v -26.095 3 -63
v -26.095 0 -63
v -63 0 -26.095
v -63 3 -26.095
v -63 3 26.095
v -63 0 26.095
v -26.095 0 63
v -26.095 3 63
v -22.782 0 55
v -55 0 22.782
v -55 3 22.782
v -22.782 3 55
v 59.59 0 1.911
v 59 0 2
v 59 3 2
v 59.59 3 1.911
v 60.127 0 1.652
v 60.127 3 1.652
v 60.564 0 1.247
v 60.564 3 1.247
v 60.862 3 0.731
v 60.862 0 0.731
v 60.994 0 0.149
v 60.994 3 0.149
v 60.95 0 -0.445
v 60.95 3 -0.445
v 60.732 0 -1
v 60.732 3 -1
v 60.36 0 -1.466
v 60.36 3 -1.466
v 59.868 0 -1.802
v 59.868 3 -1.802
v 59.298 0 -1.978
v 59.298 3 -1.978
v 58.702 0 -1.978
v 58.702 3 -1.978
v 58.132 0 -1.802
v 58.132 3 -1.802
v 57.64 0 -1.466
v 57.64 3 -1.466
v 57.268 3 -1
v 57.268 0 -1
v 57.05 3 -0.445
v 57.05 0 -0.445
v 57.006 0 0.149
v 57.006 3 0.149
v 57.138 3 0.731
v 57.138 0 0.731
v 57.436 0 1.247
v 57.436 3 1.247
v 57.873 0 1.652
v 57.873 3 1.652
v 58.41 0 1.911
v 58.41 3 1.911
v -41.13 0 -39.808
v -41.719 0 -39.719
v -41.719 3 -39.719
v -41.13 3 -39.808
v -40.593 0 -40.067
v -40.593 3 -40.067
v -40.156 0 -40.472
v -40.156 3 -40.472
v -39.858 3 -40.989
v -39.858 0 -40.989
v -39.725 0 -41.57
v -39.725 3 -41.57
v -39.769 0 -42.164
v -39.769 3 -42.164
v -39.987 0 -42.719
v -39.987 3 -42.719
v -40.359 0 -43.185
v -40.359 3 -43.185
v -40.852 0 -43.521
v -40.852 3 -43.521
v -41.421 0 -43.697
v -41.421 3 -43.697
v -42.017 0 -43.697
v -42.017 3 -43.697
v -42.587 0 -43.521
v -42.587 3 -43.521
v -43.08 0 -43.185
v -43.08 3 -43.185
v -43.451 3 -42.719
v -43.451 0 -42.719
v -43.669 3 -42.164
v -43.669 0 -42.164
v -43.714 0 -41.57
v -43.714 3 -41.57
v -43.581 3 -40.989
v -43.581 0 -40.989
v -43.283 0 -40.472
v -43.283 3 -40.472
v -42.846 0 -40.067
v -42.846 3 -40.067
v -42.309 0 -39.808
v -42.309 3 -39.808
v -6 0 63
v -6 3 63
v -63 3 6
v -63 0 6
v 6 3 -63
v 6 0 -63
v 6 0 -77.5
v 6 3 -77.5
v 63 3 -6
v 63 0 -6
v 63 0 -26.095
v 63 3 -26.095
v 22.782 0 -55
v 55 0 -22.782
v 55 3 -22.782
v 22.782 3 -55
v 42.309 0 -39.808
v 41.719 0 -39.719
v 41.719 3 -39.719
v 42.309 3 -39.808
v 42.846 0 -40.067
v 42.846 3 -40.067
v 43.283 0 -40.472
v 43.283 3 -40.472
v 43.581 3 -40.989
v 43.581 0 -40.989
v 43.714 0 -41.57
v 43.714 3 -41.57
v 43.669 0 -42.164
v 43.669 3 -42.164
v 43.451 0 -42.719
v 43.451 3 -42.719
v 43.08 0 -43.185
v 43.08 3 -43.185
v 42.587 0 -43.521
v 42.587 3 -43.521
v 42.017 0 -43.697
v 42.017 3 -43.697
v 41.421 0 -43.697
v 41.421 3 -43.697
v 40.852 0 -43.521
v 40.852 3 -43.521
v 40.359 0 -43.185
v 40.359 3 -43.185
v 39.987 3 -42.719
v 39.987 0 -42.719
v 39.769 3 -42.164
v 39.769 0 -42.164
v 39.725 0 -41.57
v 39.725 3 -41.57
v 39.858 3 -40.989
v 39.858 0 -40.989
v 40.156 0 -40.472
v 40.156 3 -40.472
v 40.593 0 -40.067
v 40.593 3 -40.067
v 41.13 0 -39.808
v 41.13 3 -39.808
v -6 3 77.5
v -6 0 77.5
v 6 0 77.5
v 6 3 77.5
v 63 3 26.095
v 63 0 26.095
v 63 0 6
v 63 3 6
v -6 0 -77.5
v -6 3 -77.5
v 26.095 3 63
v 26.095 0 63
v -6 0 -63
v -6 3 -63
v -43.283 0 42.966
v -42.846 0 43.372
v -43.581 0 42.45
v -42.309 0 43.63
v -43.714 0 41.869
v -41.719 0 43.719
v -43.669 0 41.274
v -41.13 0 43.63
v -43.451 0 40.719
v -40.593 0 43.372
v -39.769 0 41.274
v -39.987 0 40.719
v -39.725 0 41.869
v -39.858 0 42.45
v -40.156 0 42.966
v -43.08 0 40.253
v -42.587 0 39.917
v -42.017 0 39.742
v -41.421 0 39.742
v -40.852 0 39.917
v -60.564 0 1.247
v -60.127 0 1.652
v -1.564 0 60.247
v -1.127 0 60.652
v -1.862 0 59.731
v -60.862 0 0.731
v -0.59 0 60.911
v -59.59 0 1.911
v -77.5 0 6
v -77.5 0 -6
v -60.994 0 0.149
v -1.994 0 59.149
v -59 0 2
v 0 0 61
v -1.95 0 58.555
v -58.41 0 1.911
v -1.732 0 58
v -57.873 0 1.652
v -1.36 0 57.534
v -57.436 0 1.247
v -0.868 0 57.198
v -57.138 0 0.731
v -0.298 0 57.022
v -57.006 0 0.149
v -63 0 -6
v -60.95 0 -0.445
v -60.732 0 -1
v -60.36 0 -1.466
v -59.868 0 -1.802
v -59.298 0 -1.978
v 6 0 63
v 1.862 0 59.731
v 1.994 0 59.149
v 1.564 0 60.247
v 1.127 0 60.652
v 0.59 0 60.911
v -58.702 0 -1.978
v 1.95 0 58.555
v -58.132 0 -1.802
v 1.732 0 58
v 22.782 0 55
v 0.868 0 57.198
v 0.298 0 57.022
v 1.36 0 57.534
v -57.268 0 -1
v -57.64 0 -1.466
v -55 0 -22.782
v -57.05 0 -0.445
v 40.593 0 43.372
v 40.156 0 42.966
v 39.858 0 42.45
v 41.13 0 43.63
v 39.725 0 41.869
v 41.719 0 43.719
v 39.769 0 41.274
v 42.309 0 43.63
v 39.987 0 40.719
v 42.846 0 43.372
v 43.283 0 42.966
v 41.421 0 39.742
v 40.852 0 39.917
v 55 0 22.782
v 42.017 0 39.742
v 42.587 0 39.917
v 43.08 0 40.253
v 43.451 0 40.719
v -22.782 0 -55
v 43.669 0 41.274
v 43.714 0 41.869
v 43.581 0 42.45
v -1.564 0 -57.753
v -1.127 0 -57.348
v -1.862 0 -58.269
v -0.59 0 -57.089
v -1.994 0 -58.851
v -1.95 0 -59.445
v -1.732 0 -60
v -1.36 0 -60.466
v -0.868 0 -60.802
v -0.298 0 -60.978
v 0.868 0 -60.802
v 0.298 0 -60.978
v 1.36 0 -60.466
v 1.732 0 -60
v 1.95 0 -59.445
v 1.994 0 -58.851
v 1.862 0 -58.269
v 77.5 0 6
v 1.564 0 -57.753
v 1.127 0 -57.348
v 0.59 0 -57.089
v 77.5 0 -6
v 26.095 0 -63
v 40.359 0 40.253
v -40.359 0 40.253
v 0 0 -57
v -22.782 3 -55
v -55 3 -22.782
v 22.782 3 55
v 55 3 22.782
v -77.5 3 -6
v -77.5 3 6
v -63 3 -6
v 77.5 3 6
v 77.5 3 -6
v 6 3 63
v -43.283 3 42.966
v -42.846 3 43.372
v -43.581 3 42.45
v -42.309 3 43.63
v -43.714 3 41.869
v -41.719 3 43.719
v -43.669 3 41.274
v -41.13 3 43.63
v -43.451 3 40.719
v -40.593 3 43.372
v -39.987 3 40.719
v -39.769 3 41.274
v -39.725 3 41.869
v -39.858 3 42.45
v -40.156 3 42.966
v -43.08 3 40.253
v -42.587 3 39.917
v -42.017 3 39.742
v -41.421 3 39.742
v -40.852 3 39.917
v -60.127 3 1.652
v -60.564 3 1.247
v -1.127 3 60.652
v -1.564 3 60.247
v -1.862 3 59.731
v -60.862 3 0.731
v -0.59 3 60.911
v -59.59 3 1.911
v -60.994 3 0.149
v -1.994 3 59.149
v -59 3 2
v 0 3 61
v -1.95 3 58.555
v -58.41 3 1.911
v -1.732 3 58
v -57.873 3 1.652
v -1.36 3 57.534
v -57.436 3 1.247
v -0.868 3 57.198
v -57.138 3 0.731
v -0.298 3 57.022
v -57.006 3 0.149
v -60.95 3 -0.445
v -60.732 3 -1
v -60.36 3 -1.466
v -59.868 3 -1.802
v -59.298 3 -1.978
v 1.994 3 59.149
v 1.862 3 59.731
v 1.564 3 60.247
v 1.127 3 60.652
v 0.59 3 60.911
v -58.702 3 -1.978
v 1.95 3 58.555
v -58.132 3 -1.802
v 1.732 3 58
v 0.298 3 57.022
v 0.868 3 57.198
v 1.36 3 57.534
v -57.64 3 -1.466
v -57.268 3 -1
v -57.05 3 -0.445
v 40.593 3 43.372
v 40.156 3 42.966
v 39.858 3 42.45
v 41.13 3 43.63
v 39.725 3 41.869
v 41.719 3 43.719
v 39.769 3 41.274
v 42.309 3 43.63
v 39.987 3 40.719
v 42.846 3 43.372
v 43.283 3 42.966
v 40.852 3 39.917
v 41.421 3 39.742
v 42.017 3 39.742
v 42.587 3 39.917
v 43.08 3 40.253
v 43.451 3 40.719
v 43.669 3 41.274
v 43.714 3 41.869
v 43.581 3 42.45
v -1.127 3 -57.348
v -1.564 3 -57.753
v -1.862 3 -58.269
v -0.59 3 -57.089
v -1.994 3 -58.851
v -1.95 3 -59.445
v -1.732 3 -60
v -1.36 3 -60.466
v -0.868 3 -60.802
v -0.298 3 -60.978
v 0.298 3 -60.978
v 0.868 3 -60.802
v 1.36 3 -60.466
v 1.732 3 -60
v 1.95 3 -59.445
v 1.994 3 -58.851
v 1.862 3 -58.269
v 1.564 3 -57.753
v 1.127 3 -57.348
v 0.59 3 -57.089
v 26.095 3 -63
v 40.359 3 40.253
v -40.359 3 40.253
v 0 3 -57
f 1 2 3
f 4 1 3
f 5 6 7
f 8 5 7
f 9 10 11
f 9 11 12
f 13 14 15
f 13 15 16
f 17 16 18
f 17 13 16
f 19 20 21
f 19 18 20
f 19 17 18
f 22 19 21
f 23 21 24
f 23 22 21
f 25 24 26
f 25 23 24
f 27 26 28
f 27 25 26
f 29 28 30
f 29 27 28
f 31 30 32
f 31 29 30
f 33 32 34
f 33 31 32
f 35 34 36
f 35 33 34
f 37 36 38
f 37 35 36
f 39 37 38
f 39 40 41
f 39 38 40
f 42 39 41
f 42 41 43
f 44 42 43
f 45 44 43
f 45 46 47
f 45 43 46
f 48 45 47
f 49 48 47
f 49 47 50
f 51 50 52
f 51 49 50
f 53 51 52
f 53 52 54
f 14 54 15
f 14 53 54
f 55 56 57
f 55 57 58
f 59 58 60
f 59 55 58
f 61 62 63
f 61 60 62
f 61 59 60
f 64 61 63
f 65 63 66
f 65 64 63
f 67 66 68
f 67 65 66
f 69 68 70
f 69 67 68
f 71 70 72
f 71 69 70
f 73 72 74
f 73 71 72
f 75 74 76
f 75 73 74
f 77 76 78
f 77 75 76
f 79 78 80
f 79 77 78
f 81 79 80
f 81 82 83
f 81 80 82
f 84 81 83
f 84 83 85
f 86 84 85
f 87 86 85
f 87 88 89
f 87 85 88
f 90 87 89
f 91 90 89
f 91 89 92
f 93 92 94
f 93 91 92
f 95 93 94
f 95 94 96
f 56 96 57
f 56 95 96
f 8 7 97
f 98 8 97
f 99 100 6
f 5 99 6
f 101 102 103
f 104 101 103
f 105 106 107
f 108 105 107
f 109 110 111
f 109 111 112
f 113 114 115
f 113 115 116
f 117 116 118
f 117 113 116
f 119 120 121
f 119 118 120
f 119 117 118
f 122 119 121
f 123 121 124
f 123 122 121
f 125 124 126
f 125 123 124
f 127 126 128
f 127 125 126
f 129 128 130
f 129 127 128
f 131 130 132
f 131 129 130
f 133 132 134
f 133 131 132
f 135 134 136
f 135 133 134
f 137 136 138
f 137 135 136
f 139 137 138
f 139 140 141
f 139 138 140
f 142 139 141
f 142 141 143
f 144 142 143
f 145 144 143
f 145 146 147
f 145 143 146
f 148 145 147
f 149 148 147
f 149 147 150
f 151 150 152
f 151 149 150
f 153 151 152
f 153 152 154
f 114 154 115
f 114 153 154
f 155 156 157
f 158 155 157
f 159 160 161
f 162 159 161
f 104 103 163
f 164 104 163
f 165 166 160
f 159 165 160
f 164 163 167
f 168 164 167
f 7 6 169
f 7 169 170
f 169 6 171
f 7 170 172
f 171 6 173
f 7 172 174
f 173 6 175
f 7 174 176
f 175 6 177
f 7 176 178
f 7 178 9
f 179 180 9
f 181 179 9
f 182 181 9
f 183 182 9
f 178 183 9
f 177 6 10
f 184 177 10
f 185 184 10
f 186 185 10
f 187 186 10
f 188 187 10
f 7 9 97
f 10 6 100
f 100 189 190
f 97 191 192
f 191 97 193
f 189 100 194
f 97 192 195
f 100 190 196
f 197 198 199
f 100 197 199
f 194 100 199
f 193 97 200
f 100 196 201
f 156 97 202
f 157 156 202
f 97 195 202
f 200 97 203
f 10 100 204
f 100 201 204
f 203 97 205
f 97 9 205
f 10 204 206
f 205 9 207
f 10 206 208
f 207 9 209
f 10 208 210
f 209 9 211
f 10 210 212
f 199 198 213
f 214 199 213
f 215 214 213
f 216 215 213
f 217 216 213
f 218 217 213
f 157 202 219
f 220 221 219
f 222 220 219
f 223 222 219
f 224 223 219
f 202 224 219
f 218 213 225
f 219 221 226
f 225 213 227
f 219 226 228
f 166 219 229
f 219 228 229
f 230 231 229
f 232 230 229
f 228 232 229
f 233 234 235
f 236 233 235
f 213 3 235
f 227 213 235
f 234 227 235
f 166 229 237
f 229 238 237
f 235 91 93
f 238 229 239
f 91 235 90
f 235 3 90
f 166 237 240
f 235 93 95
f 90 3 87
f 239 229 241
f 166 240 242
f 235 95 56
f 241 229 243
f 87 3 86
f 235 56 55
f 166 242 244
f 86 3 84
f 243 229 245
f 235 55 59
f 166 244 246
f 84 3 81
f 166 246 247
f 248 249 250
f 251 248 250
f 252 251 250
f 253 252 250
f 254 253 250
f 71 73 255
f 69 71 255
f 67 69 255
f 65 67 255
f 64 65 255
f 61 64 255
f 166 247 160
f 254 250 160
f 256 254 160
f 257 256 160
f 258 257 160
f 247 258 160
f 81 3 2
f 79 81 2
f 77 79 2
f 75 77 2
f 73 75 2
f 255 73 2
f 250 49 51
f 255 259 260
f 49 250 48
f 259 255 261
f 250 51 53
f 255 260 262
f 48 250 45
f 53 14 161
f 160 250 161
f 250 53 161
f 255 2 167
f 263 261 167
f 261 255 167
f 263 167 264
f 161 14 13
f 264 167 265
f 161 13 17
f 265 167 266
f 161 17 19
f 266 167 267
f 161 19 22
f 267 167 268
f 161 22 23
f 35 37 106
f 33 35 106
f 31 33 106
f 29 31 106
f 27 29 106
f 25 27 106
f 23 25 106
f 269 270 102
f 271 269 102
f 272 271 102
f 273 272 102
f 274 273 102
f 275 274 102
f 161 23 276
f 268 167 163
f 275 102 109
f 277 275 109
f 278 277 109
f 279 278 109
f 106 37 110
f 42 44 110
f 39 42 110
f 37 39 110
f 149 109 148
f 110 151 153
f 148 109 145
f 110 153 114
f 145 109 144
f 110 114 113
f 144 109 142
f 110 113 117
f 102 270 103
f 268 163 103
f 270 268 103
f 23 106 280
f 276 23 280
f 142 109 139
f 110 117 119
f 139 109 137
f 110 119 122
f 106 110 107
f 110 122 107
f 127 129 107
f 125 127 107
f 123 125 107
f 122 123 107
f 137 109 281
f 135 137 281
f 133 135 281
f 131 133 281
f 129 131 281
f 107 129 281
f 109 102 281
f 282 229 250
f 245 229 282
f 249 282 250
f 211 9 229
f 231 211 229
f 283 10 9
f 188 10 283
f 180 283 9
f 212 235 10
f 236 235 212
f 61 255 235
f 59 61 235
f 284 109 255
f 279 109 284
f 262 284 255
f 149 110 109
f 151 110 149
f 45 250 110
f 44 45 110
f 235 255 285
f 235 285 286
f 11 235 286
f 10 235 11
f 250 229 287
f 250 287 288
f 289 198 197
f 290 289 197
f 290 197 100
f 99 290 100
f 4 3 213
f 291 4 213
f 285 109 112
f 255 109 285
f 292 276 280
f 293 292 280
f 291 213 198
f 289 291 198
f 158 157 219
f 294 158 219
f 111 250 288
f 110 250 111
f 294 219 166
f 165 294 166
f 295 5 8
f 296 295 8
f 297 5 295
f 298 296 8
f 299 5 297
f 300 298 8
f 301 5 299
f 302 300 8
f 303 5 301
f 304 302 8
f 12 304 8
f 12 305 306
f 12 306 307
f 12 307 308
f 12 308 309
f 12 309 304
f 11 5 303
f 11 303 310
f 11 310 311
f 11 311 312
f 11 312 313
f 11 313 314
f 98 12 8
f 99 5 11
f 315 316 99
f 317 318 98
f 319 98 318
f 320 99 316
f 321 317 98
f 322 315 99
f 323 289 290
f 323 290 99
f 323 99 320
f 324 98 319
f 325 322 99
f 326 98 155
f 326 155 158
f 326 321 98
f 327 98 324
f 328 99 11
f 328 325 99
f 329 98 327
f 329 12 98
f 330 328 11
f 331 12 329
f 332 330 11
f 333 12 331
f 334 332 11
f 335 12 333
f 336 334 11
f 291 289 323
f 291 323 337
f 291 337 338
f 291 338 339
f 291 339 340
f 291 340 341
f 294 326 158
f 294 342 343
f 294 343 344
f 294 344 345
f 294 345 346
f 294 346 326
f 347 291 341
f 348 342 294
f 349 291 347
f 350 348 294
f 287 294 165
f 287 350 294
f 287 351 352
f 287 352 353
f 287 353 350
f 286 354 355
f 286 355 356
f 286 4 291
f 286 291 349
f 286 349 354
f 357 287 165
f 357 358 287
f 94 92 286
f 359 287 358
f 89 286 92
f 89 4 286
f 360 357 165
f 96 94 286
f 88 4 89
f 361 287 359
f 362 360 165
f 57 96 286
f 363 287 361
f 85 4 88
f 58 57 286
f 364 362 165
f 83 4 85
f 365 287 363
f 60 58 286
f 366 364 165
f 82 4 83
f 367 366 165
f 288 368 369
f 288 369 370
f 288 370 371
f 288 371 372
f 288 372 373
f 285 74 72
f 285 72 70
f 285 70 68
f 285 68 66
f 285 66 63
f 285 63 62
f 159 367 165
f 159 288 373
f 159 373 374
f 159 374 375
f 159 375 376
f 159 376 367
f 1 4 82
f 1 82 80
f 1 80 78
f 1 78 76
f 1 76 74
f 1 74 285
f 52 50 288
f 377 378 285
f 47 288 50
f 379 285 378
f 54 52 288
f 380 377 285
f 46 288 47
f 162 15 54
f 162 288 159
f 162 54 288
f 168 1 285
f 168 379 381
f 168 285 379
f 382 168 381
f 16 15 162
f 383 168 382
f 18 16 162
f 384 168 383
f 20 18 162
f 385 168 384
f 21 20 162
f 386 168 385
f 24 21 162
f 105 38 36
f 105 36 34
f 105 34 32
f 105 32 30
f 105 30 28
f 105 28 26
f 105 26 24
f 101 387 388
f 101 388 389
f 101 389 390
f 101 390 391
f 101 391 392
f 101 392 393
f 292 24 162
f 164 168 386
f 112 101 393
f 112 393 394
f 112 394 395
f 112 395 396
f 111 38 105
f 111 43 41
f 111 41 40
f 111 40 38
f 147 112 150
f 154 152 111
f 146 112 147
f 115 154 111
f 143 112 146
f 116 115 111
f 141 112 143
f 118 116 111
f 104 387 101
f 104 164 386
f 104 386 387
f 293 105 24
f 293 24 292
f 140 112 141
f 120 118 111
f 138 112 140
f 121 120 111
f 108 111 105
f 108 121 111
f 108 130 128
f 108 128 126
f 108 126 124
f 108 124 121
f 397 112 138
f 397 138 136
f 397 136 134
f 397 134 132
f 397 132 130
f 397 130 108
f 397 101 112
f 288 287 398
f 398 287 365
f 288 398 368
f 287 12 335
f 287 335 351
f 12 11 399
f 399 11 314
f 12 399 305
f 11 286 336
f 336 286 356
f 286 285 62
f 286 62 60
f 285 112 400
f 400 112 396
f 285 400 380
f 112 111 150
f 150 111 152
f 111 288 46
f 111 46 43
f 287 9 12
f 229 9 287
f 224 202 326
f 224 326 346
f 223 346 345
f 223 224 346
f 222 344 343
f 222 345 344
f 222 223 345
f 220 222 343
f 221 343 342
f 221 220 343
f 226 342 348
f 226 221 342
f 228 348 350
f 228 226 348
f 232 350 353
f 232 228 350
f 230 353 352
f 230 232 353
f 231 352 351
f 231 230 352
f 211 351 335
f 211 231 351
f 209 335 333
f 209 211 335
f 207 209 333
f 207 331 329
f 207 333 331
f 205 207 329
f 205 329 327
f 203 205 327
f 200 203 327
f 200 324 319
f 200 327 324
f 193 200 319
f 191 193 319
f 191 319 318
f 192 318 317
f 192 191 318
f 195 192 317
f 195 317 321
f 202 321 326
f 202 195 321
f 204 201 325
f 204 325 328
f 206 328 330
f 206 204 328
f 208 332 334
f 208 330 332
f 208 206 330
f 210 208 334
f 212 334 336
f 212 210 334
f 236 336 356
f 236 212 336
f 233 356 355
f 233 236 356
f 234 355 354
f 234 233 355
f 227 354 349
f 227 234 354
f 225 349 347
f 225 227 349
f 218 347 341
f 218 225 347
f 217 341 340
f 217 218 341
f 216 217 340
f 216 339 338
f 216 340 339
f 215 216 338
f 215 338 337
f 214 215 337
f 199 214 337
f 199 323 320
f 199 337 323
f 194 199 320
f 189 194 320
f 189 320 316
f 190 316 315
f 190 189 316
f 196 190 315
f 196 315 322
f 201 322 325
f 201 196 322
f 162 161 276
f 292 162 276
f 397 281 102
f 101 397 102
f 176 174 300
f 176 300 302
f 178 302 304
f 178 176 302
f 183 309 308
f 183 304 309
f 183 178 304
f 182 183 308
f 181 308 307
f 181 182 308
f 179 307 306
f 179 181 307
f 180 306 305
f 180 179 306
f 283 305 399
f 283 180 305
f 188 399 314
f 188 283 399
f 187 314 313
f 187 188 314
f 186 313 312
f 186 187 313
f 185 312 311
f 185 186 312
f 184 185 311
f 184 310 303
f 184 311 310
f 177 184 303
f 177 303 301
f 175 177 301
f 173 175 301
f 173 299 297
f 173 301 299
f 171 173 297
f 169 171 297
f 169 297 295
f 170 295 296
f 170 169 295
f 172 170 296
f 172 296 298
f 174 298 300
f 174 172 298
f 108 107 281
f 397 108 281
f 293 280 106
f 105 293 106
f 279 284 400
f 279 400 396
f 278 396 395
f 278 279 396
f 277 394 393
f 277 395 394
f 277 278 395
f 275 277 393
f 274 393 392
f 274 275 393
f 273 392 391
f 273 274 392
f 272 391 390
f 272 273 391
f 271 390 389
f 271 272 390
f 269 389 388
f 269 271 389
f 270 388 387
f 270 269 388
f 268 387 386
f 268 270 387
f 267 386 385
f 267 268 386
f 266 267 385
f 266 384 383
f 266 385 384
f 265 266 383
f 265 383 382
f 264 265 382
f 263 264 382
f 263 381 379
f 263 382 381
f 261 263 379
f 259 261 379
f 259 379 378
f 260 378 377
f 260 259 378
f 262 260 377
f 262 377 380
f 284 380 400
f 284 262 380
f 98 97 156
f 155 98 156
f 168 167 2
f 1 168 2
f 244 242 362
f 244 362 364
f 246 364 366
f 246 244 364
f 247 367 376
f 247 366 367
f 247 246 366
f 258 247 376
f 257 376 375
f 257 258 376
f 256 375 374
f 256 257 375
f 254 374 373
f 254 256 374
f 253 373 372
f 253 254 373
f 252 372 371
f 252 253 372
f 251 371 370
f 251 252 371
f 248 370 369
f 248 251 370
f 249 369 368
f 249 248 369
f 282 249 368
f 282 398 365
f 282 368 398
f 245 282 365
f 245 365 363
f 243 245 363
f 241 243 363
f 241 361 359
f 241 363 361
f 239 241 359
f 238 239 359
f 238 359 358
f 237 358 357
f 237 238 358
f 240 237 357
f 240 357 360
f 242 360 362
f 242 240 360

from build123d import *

# Parameters (mm, degrees)
BOSS_EXTRUDE1_DEPTH     = 3
CUT_EXTRUDE1_DEPTH      = 84
CUT_EXTRUDE1_DEPTH_BACK = 76
SKETCH3_R               = 2


with BuildPart() as part:
    # Sketch2 → Boss-Extrude1 (new body)
    with BuildSketch(Plane(origin=(0, 0, 0), x_dir=(1, 0, 0), z_dir=(0, 1, 0))):
        Polygon((6, -77.5), (6, -63), (26.09545443, -63), (63, -26.09545443), (63, -6), (77.5, -6), (77.5, 6), (63, 6), (63, 26.09545443), (26.09545443, 63), (6, 63), (6, 77.5), (-6, 77.5), (-6, 63), (-26.09545443, 63), (-63, 26.09545443), (-63, 6), (-77.5, 6), (-77.5, -6), (-63, -6), (-63, -26.09545443), (-26.09545443, -63), (-6, -63), (-6, -77.5), align=None)
        Polygon((22.781745931, -55), (55, -22.781745931), (55, 22.781745931), (22.781745931, 55), (-22.781745931, 55), (-55, 22.781745931), (-55, -22.781745931), (-22.781745931, -55), align=None, mode=Mode.SUBTRACT)
    extrude(amount=BOSS_EXTRUDE1_DEPTH)

    # Sketch3 → Cut-Extrude1 (cut, two sides: drawn at the far end of the back side and taken through both)
    with BuildSketch(Plane(origin=(0, 3, 0), x_dir=(1, 0, 0), z_dir=(0, 1, 0)).offset(-CUT_EXTRUDE1_DEPTH_BACK)):
        with Locations(Location((0, 59, 0), (0, 0, 270))):
            Circle(SKETCH3_R)
        with Locations(Location((41.71930009, 41.71930009, 0), (0, 0, 270))):
            Circle(SKETCH3_R)
        with Locations(Location((59, 0, 0), (0, 0, 270))):
            Circle(SKETCH3_R)
        with Locations(Location((41.71930009, -41.71930009, 0), (0, 0, 270))):
            Circle(SKETCH3_R)
        with Locations(Location((0, -59, 0), (0, 0, 270))):
            Circle(SKETCH3_R)
        with Locations(Location((-41.71930009, -41.71930009, 0), (0, 0, 270))):
            Circle(SKETCH3_R)
        with Locations(Location((-59, 0, 0), (0, 0, 270))):
            Circle(SKETCH3_R)
        with Locations(Location((-41.71930009, 41.71930009, 0), (0, 0, 270))):
            Circle(SKETCH3_R)
    extrude(amount=CUT_EXTRUDE1_DEPTH + CUT_EXTRUDE1_DEPTH_BACK, mode=Mode.SUBTRACT)


solid = part.part
